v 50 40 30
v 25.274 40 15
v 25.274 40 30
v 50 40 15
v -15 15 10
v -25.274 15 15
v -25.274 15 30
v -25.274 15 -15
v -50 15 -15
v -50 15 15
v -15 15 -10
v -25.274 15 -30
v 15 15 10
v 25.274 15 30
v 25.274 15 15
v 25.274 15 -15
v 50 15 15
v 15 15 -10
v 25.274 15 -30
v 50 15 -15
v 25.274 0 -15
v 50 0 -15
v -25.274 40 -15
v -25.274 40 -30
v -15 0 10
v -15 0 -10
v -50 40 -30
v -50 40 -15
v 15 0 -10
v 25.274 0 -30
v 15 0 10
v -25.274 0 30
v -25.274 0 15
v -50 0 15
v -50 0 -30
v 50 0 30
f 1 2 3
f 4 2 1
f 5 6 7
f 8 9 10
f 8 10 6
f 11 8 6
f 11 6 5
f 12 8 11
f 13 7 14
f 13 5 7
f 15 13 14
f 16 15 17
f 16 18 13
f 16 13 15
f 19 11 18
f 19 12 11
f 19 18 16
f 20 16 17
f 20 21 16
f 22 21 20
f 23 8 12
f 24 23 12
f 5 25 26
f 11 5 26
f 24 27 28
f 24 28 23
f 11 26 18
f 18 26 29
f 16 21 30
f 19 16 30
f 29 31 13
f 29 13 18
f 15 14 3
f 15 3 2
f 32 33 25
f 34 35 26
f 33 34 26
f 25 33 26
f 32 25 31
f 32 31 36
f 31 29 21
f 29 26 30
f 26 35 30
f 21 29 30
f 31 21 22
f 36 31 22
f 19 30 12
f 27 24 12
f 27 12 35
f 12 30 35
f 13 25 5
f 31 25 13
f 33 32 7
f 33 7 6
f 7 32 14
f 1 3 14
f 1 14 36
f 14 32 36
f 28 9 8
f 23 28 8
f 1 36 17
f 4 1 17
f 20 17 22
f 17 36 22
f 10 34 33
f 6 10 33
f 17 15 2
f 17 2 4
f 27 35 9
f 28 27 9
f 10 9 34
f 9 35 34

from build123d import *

# Parameters (mm, degrees)
SKETCH1_W           = 100
SKETCH1_H           = 60
BOSS_EXTRUDE1_DEPTH = 15
SKETCH1_4_W         = 24.726477024
SKETCH1_4_H         = 15
BOSS_EXTRUDE2_DEPTH = 40
SKETCH1_5_W         = 24.726477024
SKETCH1_5_H         = 15
CUT_EXTRUDE1_DEPTH  = 40
SKETCH1_6_W         = 30
SKETCH1_6_H         = 20
CUT_EXTRUDE2_DEPTH  = 40


with BuildPart() as part:
    # Sketch1 → Boss-Extrude1 (new body)
    with BuildSketch(Plane(origin=(0, 0, 0), x_dir=(1, 0, 0), z_dir=(0, 1, 0))):
        Rectangle(SKETCH1_W, SKETCH1_H)
    extrude(amount=BOSS_EXTRUDE1_DEPTH)

    # Sketch1<4> → Boss-Extrude2 (add)
    with BuildSketch(Plane(origin=(0, 0, 0), x_dir=(1, 0, 0), z_dir=(0, 1, 0))):
        with Locations((-37.636761488, 22.5)):
            Rectangle(SKETCH1_4_W, SKETCH1_4_H)
        with Locations((37.636761488, -22.5)):
            Rectangle(SKETCH1_4_W, SKETCH1_4_H)
    extrude(amount=BOSS_EXTRUDE2_DEPTH)

    # Sketch1<5> → Cut-Extrude1 (cut)
    with BuildSketch(Plane(origin=(0, 0, 0), x_dir=(1, 0, 0), z_dir=(0, 1, 0))):
        with Locations((37.636761488, 22.5)):
            Rectangle(SKETCH1_5_W, SKETCH1_5_H)
        with Locations((-37.636761488, -22.5)):
            Rectangle(SKETCH1_5_W, SKETCH1_5_H)
    extrude(amount=CUT_EXTRUDE1_DEPTH, mode=Mode.SUBTRACT)

    # Sketch1<6> → Cut-Extrude2 (cut)
    with BuildSketch(Plane(origin=(0, 0, 0), x_dir=(1, 0, 0), z_dir=(0, 1, 0))):
        Rectangle(SKETCH1_6_W, SKETCH1_6_H)
    extrude(amount=CUT_EXTRUDE2_DEPTH, mode=Mode.SUBTRACT)


solid = part.part
